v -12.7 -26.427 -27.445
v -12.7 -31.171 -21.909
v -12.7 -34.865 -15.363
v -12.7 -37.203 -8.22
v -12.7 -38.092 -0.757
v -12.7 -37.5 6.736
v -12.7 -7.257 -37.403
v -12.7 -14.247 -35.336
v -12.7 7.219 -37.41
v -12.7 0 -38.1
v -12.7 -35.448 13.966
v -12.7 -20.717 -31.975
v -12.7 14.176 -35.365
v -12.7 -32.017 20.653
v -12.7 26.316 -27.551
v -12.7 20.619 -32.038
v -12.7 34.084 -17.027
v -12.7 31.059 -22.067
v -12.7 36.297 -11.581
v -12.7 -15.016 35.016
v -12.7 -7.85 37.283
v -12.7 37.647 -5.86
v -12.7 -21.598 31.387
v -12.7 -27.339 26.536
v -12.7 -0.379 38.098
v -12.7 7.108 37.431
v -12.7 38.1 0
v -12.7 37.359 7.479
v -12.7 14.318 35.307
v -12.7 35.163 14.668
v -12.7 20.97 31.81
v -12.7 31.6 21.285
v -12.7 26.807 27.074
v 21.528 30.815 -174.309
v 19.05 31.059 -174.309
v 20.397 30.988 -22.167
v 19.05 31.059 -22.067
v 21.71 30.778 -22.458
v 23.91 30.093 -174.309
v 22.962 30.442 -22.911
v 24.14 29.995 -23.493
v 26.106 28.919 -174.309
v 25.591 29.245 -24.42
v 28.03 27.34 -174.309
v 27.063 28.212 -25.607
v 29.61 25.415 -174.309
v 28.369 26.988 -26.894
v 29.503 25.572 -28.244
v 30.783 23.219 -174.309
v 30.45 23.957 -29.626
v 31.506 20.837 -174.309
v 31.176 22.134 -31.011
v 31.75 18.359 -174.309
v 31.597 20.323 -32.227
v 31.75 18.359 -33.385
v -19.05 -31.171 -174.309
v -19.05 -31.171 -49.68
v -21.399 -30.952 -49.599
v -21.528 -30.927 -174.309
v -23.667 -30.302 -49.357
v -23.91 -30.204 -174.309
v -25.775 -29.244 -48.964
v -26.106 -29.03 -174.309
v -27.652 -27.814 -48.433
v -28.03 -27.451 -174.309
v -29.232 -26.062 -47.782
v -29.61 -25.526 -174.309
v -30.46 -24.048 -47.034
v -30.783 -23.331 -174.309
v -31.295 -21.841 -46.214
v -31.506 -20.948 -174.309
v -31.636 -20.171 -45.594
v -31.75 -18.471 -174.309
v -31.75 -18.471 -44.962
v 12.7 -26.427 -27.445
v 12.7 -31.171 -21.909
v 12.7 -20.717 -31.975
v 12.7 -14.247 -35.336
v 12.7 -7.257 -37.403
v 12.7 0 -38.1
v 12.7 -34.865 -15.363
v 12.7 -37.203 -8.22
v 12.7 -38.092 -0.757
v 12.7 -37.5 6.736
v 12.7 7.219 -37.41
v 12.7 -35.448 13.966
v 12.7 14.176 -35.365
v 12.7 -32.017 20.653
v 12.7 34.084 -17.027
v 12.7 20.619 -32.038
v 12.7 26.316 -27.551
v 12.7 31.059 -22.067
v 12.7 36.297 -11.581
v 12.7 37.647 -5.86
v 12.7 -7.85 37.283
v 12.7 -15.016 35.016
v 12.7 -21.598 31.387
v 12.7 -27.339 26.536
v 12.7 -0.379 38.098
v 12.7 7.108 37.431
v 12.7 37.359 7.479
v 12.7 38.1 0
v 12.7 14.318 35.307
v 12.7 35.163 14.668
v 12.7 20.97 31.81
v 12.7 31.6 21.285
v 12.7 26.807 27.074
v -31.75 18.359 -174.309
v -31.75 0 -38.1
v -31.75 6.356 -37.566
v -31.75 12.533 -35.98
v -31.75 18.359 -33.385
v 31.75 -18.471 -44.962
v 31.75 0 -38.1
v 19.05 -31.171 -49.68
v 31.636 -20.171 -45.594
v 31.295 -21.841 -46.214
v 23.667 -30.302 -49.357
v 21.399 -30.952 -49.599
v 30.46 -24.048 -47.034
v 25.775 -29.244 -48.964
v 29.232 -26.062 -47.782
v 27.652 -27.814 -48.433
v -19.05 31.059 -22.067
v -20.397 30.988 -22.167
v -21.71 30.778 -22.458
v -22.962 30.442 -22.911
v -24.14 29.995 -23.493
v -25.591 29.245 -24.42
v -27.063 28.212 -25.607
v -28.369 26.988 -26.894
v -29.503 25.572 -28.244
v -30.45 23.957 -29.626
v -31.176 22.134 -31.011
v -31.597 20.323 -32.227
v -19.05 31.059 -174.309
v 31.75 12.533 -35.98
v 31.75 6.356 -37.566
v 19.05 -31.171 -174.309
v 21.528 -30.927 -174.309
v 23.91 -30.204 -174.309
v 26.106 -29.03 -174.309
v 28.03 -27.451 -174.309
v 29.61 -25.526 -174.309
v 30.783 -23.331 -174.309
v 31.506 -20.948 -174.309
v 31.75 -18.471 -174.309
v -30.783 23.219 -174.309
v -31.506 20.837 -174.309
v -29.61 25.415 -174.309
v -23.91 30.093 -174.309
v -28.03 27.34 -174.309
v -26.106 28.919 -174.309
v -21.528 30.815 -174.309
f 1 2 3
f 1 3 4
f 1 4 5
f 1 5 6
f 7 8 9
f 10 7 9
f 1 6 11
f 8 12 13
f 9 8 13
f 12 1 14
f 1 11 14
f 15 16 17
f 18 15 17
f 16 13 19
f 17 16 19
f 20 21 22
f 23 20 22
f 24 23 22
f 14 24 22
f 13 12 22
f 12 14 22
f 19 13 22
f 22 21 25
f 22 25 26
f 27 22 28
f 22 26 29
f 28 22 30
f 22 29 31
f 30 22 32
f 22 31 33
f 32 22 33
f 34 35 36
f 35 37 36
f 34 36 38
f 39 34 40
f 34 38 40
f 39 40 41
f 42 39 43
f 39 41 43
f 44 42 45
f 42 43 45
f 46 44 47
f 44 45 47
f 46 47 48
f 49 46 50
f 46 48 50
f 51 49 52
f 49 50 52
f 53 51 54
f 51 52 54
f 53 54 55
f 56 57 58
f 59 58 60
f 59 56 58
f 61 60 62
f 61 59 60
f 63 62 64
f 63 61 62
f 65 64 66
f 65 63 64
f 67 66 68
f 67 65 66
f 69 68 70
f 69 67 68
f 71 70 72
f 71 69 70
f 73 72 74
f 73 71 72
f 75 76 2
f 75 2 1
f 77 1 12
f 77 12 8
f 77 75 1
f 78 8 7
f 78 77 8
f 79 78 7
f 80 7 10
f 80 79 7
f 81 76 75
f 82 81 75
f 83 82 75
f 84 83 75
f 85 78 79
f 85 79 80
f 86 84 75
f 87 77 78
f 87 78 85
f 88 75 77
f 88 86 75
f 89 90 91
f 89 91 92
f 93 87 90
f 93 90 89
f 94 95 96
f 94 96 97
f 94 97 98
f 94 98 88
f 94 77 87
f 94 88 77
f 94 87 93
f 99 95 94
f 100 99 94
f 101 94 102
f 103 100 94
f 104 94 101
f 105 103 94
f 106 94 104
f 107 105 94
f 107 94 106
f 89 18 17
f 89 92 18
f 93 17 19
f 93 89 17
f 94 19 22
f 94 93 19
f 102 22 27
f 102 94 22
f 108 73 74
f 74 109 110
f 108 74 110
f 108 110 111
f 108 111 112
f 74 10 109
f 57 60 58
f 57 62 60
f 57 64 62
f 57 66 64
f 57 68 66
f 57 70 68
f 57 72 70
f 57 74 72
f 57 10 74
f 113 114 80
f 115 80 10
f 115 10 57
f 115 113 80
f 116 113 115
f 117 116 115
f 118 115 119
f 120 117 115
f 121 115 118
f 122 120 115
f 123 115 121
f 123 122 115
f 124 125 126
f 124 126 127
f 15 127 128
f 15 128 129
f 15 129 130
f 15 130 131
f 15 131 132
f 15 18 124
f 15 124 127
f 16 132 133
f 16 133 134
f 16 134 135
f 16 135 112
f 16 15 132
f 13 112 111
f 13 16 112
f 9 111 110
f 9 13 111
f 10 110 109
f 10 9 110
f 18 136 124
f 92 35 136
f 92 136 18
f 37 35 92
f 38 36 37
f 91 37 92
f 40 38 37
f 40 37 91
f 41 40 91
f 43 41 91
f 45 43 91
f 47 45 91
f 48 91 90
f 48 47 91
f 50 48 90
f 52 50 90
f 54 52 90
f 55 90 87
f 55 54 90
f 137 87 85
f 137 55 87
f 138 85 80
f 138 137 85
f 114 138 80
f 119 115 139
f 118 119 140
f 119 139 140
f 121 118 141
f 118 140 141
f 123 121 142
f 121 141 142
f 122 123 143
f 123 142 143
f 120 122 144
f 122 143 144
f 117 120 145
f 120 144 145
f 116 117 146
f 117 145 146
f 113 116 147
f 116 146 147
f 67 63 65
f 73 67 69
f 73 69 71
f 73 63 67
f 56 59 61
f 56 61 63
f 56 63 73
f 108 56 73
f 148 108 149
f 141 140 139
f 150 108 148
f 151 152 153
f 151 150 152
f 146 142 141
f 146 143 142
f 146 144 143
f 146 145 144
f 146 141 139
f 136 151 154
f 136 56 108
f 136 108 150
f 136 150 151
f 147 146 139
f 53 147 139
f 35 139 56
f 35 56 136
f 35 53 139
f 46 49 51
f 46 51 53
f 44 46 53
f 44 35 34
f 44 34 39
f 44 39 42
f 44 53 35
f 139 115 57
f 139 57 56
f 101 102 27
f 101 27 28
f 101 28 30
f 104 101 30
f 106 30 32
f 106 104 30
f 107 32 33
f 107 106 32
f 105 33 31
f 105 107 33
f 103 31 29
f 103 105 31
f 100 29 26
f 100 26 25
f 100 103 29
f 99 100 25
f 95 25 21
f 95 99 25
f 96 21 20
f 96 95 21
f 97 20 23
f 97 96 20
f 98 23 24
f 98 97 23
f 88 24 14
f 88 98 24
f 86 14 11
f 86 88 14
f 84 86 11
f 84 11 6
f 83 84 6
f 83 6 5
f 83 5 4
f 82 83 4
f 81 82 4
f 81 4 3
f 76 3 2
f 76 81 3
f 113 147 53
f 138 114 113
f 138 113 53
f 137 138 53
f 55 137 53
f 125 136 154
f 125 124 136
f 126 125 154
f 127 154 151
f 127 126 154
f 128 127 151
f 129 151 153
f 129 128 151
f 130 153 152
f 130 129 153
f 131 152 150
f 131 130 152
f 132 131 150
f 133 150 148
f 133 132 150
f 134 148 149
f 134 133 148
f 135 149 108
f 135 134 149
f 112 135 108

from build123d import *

# Parameters (mm, degrees)
F1_DEPTH = 12.7
F2_DEPTH = 31.75
F3_R     = 12.7


with BuildPart() as f1:
    # F0 (on Right) → F1 (new body, symmetric)
    with BuildSketch(Plane.YZ):
        with BuildLine():
            ThreePointArc((31.059256, -22.06655), (36.29716, -11.581285), (38.1, 0))
            ThreePointArc((38.1, 0), (-11.489227, 36.326405), (-31.170744, -21.908782))
            Line((-31.170744, -21.908782), (31.059256, -21.908782))
            Line((31.059256, -21.908782), (31.059256, -22.06655))
        make_face()
        with BuildLine():
            Line((31.059256, -174.308782), (31.059256, -22.06655))
            ThreePointArc((31.059256, -22.06655), (17.476763, -33.855173), (0, -38.1))
            Line((0, -38.1), (-31.170744, -49.680229))
            Line((-31.170744, -49.680229), (-31.170744, -174.308782))
            Line((-31.170744, -174.308782), (31.059256, -174.308782))
        make_face()
        with BuildLine():
            Line((31.059256, -21.908782), (-31.170744, -21.908782))
            ThreePointArc((-31.170744, -21.908782), (-17.562537, -33.810757), (0, -38.1))
            ThreePointArc((0, -38.1), (17.476763, -33.855173), (31.059256, -22.06655))
            Line((31.059256, -22.06655), (31.059256, -21.908782))
        make_face()
    extrude(amount=F1_DEPTH, both=True)

    # F0 (on Right) → F2 (join, symmetric)
    with BuildSketch(Plane.YZ):
        with BuildLine():
            Line((31.059256, -174.308782), (31.059256, -22.06655))
            ThreePointArc((31.059256, -22.06655), (17.476763, -33.855173), (0, -38.1))
            Line((0, -38.1), (-31.170744, -49.680229))
            Line((-31.170744, -49.680229), (-31.170744, -174.308782))
            Line((-31.170744, -174.308782), (31.059256, -174.308782))
        make_face()
    extrude(amount=F2_DEPTH, both=True)

    # F3
    f3_edges = [f1.edges().sort_by_distance(p)[0] for p in [
        (31.75, -31.170744, -111.994506),
        (31.75, 31.059256, -98.187666),
        (-31.75, -31.170744, -111.994506),
        (-31.75, 31.059256, -98.187666),
    ]]
    fillet(f3_edges, radius=F3_R)


solid = f1.part
